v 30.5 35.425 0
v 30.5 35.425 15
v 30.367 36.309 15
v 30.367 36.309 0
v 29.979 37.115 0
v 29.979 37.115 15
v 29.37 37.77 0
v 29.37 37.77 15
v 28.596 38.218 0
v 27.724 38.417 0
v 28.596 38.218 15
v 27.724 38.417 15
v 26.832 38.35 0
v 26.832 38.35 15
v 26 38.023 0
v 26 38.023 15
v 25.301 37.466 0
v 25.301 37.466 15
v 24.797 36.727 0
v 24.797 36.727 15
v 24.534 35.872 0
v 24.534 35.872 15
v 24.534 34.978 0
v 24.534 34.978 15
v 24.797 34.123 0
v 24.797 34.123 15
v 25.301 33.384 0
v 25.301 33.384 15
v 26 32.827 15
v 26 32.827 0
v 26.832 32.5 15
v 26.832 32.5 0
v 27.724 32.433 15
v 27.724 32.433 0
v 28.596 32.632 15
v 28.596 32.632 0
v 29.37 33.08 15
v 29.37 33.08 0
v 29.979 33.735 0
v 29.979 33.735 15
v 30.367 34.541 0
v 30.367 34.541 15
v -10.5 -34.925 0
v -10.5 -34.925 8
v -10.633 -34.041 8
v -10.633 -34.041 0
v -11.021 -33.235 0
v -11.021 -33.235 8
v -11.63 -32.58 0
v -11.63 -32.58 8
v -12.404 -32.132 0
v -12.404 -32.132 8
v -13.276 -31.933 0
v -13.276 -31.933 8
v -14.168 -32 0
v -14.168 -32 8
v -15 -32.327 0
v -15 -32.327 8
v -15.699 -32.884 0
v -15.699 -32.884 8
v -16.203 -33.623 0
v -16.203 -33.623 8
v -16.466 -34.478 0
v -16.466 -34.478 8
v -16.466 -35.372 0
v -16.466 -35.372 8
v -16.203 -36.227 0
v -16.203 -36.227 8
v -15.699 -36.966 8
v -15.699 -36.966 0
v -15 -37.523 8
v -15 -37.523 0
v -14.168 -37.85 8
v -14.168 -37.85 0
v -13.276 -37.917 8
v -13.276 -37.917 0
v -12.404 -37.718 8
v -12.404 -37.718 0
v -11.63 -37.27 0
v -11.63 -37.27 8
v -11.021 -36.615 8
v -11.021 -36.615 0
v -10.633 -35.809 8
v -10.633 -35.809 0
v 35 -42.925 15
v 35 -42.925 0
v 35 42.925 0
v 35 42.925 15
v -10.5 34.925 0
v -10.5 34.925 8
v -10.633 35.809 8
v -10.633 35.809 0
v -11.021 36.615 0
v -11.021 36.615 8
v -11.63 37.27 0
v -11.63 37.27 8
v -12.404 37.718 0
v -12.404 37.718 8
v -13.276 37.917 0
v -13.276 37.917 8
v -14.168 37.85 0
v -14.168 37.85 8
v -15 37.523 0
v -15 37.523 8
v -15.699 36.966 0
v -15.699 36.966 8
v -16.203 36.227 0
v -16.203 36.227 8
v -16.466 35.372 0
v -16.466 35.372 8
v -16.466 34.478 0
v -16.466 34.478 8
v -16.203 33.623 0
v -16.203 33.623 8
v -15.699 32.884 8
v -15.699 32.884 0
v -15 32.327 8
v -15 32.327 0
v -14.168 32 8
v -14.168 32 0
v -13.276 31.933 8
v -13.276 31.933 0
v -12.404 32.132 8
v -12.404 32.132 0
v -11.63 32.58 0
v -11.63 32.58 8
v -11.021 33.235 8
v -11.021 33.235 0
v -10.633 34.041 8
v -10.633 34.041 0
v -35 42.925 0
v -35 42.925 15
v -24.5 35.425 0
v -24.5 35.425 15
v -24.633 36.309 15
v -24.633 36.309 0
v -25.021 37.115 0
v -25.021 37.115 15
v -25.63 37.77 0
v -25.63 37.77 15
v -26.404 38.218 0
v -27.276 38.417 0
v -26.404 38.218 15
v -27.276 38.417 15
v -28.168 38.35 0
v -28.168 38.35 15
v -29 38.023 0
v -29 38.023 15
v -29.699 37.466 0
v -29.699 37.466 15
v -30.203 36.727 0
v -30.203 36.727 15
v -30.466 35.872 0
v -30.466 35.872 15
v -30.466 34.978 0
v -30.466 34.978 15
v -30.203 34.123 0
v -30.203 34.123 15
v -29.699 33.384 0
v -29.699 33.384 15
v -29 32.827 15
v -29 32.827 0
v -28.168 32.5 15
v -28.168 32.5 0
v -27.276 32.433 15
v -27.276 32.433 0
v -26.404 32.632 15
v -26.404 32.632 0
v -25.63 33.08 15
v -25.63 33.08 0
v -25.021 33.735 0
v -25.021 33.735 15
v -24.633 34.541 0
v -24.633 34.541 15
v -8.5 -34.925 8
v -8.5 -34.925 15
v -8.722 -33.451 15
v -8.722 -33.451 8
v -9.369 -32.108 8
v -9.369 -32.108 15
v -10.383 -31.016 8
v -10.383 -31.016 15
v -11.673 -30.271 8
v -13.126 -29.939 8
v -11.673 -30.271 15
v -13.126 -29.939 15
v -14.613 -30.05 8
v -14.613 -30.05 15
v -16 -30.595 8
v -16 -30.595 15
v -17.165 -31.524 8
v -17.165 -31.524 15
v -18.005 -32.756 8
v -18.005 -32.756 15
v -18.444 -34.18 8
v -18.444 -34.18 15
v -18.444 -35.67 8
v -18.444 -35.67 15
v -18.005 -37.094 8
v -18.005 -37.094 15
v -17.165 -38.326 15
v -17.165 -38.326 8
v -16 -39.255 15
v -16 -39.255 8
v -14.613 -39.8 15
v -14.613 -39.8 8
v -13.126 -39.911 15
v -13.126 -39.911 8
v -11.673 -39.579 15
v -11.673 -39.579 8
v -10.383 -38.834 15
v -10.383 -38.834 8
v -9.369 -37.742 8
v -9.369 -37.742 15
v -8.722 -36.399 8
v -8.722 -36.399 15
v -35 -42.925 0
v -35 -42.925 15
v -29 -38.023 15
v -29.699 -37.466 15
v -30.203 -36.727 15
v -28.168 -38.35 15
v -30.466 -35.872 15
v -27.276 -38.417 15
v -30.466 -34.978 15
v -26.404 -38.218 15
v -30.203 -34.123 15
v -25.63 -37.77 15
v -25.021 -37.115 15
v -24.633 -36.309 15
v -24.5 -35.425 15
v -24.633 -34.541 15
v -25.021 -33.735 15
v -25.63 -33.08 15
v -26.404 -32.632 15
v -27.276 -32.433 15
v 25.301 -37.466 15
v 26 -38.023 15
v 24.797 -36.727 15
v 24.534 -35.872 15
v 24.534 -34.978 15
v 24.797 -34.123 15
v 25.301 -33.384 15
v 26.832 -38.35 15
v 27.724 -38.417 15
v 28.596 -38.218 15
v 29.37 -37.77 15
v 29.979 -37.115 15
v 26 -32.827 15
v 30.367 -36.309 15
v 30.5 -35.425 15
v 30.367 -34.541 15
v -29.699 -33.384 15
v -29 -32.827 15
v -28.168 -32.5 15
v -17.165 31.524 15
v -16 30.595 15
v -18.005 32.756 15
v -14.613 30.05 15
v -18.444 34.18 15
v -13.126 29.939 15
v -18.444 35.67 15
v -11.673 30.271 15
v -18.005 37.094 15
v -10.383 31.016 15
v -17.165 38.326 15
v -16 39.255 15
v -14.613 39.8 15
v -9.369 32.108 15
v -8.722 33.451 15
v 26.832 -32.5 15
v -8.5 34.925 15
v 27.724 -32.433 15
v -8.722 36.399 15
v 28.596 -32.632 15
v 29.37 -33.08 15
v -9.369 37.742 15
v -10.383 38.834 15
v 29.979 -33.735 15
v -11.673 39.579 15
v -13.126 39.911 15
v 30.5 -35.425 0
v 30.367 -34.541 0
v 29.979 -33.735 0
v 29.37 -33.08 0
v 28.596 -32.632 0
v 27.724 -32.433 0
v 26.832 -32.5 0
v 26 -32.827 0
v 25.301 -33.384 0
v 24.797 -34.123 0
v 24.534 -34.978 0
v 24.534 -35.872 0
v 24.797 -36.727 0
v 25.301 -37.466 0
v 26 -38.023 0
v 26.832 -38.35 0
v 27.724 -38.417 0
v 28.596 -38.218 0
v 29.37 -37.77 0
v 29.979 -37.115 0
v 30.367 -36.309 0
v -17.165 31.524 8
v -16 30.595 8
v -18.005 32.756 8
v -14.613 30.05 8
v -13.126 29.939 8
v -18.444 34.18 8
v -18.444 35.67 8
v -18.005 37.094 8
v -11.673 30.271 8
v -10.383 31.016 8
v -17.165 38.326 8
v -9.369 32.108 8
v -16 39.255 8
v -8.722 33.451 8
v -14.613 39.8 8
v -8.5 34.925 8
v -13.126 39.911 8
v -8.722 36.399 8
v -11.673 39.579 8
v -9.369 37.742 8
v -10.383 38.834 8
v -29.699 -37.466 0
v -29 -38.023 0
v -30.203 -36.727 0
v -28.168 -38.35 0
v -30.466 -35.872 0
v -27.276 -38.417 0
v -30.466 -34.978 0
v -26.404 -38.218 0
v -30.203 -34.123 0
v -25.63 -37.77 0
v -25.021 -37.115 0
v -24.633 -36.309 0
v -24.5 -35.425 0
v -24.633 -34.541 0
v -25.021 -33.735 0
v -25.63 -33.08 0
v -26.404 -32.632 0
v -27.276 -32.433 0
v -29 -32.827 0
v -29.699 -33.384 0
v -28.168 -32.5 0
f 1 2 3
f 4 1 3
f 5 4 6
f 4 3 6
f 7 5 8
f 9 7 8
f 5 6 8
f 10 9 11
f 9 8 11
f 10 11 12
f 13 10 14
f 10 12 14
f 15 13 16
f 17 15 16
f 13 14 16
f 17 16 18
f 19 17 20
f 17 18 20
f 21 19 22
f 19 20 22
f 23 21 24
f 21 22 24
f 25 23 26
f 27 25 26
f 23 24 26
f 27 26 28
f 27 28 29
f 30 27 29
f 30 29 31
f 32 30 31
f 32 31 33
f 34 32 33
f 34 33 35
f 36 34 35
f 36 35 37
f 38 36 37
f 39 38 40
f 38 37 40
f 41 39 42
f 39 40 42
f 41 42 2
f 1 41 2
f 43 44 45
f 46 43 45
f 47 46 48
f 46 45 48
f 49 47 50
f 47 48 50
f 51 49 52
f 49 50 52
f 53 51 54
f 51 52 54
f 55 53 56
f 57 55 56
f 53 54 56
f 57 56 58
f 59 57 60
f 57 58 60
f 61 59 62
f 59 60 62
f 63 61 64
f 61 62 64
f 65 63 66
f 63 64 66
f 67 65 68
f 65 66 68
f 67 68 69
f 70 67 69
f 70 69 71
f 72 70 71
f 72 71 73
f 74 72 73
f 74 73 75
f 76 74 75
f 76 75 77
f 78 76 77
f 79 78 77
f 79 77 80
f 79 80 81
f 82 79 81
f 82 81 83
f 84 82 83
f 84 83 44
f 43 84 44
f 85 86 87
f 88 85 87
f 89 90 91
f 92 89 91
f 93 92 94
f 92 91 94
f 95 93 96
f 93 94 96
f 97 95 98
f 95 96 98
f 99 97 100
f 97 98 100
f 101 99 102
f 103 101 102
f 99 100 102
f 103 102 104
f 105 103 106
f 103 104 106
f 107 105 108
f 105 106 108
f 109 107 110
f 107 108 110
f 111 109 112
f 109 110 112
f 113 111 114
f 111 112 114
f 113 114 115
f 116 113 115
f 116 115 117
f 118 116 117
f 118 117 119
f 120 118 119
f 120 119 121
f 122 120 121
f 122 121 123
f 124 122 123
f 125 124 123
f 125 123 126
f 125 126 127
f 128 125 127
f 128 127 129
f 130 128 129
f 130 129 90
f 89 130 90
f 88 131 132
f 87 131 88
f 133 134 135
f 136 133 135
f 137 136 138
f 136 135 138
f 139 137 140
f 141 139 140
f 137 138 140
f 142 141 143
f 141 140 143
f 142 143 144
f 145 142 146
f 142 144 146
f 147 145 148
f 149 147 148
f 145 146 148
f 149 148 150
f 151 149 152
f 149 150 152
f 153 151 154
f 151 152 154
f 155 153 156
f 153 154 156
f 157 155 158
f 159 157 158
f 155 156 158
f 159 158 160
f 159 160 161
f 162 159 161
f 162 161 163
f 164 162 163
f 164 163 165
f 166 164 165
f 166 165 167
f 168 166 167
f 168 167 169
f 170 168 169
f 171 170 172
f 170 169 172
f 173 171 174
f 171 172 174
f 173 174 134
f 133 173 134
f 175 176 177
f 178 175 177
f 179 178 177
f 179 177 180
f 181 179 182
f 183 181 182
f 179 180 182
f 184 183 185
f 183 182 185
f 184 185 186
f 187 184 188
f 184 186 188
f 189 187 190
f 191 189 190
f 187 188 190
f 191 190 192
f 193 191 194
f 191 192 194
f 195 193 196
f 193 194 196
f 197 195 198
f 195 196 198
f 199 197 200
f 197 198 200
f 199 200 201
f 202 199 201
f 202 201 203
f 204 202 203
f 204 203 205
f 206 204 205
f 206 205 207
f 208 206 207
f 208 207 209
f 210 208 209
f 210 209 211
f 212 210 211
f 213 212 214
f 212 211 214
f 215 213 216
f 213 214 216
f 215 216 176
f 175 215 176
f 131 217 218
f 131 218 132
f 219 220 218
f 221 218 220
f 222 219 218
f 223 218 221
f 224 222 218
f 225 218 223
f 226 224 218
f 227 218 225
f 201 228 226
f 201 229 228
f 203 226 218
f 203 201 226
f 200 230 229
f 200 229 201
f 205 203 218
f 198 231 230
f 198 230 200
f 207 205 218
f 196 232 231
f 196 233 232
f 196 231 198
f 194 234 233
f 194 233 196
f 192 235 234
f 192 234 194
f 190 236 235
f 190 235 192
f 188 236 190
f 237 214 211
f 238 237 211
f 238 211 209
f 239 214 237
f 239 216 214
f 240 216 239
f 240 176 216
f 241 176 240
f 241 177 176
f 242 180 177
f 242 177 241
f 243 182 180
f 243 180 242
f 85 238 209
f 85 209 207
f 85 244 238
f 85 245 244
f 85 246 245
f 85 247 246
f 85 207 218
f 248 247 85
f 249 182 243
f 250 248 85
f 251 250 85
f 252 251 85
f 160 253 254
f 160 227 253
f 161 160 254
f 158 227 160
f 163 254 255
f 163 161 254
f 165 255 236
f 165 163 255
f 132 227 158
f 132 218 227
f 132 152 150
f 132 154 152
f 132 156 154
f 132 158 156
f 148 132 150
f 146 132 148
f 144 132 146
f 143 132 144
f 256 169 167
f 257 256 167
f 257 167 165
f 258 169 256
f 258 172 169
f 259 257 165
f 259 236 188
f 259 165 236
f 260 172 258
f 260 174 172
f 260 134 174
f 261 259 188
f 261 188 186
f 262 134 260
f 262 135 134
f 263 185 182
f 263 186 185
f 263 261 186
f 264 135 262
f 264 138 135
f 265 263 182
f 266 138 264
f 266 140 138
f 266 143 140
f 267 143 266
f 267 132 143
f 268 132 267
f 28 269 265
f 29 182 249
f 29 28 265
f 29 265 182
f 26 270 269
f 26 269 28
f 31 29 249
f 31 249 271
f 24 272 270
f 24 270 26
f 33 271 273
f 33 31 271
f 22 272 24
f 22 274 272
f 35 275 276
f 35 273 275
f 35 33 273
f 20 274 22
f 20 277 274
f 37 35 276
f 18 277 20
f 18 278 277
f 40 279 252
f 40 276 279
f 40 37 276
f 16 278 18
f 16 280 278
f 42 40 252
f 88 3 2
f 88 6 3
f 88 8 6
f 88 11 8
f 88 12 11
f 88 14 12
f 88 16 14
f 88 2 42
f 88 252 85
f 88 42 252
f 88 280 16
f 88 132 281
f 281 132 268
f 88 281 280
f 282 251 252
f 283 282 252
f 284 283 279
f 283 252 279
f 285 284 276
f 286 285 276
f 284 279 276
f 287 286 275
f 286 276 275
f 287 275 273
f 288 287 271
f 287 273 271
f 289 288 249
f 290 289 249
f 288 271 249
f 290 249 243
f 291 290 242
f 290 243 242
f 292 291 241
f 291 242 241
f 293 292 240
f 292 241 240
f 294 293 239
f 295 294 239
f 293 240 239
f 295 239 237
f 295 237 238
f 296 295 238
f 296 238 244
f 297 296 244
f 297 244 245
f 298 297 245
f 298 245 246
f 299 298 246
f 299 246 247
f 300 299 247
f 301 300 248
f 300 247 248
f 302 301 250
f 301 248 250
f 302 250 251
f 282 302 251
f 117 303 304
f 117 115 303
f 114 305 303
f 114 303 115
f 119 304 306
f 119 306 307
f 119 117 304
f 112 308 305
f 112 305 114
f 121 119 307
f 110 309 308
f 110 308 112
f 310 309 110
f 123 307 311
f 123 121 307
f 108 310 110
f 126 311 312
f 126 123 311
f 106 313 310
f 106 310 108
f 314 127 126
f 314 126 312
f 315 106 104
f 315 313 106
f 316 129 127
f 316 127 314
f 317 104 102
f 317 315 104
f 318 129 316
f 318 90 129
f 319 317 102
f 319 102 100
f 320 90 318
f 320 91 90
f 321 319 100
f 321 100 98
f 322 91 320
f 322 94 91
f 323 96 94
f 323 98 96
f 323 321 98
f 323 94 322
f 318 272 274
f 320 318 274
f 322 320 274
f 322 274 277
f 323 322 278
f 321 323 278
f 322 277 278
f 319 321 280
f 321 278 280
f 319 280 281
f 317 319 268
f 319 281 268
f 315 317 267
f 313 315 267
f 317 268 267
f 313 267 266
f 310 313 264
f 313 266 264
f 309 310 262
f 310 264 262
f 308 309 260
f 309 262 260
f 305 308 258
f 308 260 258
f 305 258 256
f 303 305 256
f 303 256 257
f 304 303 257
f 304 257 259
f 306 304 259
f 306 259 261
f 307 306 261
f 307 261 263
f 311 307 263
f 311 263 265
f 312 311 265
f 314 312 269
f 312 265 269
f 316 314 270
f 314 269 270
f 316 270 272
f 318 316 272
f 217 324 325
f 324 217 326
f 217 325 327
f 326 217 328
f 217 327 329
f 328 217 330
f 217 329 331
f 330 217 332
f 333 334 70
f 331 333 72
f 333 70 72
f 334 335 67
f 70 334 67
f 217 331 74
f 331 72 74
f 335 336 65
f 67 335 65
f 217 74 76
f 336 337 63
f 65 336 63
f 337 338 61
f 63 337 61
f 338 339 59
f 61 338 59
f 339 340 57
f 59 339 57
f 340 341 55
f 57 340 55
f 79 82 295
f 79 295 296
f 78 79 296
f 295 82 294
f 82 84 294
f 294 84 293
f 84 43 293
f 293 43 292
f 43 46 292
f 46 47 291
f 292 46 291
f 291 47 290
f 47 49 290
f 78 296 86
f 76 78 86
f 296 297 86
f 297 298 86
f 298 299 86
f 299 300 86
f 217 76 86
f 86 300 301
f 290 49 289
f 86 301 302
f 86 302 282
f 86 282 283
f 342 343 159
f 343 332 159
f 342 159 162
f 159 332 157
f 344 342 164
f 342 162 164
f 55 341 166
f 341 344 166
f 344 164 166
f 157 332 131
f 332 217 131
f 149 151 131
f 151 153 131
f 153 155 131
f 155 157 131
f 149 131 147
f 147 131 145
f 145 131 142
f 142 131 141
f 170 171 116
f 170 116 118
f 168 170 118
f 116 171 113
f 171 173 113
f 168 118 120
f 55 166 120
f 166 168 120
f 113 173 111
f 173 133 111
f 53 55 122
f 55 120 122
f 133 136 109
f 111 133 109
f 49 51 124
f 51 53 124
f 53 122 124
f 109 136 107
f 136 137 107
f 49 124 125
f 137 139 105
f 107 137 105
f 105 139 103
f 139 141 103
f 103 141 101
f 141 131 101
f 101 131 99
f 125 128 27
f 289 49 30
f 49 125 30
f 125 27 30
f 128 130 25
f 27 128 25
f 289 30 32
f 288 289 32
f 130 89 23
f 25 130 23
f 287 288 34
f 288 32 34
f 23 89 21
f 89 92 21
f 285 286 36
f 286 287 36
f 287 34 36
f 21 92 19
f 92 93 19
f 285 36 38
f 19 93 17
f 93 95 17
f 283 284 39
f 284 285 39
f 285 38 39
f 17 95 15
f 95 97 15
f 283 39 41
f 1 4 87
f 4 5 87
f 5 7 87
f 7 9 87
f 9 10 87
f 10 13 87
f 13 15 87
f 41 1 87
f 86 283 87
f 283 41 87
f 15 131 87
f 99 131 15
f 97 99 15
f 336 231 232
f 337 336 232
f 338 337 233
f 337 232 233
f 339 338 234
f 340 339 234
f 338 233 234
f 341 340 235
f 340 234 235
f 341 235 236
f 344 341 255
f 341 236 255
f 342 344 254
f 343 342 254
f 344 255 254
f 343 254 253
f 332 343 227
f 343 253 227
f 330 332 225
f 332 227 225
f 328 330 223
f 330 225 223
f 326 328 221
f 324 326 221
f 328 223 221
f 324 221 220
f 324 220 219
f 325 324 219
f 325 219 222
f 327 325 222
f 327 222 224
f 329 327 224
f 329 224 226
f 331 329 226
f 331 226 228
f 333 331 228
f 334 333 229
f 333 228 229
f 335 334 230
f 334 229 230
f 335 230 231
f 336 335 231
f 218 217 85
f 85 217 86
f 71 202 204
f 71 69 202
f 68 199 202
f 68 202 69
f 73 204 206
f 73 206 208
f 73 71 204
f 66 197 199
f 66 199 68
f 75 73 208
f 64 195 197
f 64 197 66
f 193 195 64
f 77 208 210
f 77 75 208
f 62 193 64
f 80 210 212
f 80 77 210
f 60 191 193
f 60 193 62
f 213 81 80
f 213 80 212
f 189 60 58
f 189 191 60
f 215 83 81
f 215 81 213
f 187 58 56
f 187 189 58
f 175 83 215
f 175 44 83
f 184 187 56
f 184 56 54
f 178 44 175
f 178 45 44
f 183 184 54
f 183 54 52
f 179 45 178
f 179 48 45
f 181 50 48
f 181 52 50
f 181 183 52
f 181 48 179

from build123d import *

# Parameters (mm, degrees)
SZKIC1_W                    = 70
SZKIC1_H                    = 85.85
DODANIE_WYCI_GNI_CIE1_DEPTH = 15
SZKIC2_R                    = 3
WYTNIJ_WYCI_GNI_CIE1_DEPTH  = 15
SZKIC3_R                    = 5
WYTNIJ_WYCI_GNI_CIE2_DEPTH  = 7
SZKIC4_R                    = 3
WYTNIJ_WYCI_GNI_CIE3_DEPTH  = 15
SZYK_LINIOWY1_COUNT         = 2
SZYK_LINIOWY1_PITCH         = 55
SZYK_LINIOWY1_COUNT_DIR2    = 2
SZYK_LINIOWY1_PITCH_DIR2    = 70.85


with BuildPart() as part:
    # Szkic1 → Dodanie-wyciągnięcie1 (new body)
    with BuildSketch(Plane.XY):
        Rectangle(SZKIC1_W, SZKIC1_H)
    extrude(amount=DODANIE_WYCI_GNI_CIE1_DEPTH)

    # Szkic2 → Wytnij-wyciągnięcie1 (cut)
    with BuildSketch(Plane.XY.offset(15)):
        with Locations((-13.5, 34.925)):
            Circle(SZKIC2_R)
        with Locations((-13.5, -34.925)):
            Circle(SZKIC2_R)
    extrude(amount=-WYTNIJ_WYCI_GNI_CIE1_DEPTH, mode=Mode.SUBTRACT)

    # Szkic3 → Wytnij-wyciągnięcie2 (cut)
    with BuildSketch(Plane.XY.offset(15)):
        with Locations((-13.5, 34.925)):
            Circle(SZKIC3_R)
        with Locations((-13.5, -34.925)):
            Circle(SZKIC3_R)
    extrude(amount=-WYTNIJ_WYCI_GNI_CIE2_DEPTH, mode=Mode.SUBTRACT)

    # Szkic4 → Wytnij-wyciągnięcie3 (cut)
    with BuildSketch(Plane.XY.offset(15)):
        with Locations((27.5, 35.425)):
            Circle(SZKIC4_R)
    wytnij_wyci_gni_cie3 = extrude(amount=-WYTNIJ_WYCI_GNI_CIE3_DEPTH, mode=Mode.SUBTRACT)

    # Szyk liniowy1: Wytnij-wyci_gni_cie3 2 × 2
    with Locations(*[(-i * SZYK_LINIOWY1_PITCH, -j * SZYK_LINIOWY1_PITCH_DIR2, 0) for i in range(SZYK_LINIOWY1_COUNT) for j in range(SZYK_LINIOWY1_COUNT_DIR2) if (i, j) != (0, 0)]):
        add(wytnij_wyci_gni_cie3, mode=Mode.SUBTRACT)


solid = part.part
